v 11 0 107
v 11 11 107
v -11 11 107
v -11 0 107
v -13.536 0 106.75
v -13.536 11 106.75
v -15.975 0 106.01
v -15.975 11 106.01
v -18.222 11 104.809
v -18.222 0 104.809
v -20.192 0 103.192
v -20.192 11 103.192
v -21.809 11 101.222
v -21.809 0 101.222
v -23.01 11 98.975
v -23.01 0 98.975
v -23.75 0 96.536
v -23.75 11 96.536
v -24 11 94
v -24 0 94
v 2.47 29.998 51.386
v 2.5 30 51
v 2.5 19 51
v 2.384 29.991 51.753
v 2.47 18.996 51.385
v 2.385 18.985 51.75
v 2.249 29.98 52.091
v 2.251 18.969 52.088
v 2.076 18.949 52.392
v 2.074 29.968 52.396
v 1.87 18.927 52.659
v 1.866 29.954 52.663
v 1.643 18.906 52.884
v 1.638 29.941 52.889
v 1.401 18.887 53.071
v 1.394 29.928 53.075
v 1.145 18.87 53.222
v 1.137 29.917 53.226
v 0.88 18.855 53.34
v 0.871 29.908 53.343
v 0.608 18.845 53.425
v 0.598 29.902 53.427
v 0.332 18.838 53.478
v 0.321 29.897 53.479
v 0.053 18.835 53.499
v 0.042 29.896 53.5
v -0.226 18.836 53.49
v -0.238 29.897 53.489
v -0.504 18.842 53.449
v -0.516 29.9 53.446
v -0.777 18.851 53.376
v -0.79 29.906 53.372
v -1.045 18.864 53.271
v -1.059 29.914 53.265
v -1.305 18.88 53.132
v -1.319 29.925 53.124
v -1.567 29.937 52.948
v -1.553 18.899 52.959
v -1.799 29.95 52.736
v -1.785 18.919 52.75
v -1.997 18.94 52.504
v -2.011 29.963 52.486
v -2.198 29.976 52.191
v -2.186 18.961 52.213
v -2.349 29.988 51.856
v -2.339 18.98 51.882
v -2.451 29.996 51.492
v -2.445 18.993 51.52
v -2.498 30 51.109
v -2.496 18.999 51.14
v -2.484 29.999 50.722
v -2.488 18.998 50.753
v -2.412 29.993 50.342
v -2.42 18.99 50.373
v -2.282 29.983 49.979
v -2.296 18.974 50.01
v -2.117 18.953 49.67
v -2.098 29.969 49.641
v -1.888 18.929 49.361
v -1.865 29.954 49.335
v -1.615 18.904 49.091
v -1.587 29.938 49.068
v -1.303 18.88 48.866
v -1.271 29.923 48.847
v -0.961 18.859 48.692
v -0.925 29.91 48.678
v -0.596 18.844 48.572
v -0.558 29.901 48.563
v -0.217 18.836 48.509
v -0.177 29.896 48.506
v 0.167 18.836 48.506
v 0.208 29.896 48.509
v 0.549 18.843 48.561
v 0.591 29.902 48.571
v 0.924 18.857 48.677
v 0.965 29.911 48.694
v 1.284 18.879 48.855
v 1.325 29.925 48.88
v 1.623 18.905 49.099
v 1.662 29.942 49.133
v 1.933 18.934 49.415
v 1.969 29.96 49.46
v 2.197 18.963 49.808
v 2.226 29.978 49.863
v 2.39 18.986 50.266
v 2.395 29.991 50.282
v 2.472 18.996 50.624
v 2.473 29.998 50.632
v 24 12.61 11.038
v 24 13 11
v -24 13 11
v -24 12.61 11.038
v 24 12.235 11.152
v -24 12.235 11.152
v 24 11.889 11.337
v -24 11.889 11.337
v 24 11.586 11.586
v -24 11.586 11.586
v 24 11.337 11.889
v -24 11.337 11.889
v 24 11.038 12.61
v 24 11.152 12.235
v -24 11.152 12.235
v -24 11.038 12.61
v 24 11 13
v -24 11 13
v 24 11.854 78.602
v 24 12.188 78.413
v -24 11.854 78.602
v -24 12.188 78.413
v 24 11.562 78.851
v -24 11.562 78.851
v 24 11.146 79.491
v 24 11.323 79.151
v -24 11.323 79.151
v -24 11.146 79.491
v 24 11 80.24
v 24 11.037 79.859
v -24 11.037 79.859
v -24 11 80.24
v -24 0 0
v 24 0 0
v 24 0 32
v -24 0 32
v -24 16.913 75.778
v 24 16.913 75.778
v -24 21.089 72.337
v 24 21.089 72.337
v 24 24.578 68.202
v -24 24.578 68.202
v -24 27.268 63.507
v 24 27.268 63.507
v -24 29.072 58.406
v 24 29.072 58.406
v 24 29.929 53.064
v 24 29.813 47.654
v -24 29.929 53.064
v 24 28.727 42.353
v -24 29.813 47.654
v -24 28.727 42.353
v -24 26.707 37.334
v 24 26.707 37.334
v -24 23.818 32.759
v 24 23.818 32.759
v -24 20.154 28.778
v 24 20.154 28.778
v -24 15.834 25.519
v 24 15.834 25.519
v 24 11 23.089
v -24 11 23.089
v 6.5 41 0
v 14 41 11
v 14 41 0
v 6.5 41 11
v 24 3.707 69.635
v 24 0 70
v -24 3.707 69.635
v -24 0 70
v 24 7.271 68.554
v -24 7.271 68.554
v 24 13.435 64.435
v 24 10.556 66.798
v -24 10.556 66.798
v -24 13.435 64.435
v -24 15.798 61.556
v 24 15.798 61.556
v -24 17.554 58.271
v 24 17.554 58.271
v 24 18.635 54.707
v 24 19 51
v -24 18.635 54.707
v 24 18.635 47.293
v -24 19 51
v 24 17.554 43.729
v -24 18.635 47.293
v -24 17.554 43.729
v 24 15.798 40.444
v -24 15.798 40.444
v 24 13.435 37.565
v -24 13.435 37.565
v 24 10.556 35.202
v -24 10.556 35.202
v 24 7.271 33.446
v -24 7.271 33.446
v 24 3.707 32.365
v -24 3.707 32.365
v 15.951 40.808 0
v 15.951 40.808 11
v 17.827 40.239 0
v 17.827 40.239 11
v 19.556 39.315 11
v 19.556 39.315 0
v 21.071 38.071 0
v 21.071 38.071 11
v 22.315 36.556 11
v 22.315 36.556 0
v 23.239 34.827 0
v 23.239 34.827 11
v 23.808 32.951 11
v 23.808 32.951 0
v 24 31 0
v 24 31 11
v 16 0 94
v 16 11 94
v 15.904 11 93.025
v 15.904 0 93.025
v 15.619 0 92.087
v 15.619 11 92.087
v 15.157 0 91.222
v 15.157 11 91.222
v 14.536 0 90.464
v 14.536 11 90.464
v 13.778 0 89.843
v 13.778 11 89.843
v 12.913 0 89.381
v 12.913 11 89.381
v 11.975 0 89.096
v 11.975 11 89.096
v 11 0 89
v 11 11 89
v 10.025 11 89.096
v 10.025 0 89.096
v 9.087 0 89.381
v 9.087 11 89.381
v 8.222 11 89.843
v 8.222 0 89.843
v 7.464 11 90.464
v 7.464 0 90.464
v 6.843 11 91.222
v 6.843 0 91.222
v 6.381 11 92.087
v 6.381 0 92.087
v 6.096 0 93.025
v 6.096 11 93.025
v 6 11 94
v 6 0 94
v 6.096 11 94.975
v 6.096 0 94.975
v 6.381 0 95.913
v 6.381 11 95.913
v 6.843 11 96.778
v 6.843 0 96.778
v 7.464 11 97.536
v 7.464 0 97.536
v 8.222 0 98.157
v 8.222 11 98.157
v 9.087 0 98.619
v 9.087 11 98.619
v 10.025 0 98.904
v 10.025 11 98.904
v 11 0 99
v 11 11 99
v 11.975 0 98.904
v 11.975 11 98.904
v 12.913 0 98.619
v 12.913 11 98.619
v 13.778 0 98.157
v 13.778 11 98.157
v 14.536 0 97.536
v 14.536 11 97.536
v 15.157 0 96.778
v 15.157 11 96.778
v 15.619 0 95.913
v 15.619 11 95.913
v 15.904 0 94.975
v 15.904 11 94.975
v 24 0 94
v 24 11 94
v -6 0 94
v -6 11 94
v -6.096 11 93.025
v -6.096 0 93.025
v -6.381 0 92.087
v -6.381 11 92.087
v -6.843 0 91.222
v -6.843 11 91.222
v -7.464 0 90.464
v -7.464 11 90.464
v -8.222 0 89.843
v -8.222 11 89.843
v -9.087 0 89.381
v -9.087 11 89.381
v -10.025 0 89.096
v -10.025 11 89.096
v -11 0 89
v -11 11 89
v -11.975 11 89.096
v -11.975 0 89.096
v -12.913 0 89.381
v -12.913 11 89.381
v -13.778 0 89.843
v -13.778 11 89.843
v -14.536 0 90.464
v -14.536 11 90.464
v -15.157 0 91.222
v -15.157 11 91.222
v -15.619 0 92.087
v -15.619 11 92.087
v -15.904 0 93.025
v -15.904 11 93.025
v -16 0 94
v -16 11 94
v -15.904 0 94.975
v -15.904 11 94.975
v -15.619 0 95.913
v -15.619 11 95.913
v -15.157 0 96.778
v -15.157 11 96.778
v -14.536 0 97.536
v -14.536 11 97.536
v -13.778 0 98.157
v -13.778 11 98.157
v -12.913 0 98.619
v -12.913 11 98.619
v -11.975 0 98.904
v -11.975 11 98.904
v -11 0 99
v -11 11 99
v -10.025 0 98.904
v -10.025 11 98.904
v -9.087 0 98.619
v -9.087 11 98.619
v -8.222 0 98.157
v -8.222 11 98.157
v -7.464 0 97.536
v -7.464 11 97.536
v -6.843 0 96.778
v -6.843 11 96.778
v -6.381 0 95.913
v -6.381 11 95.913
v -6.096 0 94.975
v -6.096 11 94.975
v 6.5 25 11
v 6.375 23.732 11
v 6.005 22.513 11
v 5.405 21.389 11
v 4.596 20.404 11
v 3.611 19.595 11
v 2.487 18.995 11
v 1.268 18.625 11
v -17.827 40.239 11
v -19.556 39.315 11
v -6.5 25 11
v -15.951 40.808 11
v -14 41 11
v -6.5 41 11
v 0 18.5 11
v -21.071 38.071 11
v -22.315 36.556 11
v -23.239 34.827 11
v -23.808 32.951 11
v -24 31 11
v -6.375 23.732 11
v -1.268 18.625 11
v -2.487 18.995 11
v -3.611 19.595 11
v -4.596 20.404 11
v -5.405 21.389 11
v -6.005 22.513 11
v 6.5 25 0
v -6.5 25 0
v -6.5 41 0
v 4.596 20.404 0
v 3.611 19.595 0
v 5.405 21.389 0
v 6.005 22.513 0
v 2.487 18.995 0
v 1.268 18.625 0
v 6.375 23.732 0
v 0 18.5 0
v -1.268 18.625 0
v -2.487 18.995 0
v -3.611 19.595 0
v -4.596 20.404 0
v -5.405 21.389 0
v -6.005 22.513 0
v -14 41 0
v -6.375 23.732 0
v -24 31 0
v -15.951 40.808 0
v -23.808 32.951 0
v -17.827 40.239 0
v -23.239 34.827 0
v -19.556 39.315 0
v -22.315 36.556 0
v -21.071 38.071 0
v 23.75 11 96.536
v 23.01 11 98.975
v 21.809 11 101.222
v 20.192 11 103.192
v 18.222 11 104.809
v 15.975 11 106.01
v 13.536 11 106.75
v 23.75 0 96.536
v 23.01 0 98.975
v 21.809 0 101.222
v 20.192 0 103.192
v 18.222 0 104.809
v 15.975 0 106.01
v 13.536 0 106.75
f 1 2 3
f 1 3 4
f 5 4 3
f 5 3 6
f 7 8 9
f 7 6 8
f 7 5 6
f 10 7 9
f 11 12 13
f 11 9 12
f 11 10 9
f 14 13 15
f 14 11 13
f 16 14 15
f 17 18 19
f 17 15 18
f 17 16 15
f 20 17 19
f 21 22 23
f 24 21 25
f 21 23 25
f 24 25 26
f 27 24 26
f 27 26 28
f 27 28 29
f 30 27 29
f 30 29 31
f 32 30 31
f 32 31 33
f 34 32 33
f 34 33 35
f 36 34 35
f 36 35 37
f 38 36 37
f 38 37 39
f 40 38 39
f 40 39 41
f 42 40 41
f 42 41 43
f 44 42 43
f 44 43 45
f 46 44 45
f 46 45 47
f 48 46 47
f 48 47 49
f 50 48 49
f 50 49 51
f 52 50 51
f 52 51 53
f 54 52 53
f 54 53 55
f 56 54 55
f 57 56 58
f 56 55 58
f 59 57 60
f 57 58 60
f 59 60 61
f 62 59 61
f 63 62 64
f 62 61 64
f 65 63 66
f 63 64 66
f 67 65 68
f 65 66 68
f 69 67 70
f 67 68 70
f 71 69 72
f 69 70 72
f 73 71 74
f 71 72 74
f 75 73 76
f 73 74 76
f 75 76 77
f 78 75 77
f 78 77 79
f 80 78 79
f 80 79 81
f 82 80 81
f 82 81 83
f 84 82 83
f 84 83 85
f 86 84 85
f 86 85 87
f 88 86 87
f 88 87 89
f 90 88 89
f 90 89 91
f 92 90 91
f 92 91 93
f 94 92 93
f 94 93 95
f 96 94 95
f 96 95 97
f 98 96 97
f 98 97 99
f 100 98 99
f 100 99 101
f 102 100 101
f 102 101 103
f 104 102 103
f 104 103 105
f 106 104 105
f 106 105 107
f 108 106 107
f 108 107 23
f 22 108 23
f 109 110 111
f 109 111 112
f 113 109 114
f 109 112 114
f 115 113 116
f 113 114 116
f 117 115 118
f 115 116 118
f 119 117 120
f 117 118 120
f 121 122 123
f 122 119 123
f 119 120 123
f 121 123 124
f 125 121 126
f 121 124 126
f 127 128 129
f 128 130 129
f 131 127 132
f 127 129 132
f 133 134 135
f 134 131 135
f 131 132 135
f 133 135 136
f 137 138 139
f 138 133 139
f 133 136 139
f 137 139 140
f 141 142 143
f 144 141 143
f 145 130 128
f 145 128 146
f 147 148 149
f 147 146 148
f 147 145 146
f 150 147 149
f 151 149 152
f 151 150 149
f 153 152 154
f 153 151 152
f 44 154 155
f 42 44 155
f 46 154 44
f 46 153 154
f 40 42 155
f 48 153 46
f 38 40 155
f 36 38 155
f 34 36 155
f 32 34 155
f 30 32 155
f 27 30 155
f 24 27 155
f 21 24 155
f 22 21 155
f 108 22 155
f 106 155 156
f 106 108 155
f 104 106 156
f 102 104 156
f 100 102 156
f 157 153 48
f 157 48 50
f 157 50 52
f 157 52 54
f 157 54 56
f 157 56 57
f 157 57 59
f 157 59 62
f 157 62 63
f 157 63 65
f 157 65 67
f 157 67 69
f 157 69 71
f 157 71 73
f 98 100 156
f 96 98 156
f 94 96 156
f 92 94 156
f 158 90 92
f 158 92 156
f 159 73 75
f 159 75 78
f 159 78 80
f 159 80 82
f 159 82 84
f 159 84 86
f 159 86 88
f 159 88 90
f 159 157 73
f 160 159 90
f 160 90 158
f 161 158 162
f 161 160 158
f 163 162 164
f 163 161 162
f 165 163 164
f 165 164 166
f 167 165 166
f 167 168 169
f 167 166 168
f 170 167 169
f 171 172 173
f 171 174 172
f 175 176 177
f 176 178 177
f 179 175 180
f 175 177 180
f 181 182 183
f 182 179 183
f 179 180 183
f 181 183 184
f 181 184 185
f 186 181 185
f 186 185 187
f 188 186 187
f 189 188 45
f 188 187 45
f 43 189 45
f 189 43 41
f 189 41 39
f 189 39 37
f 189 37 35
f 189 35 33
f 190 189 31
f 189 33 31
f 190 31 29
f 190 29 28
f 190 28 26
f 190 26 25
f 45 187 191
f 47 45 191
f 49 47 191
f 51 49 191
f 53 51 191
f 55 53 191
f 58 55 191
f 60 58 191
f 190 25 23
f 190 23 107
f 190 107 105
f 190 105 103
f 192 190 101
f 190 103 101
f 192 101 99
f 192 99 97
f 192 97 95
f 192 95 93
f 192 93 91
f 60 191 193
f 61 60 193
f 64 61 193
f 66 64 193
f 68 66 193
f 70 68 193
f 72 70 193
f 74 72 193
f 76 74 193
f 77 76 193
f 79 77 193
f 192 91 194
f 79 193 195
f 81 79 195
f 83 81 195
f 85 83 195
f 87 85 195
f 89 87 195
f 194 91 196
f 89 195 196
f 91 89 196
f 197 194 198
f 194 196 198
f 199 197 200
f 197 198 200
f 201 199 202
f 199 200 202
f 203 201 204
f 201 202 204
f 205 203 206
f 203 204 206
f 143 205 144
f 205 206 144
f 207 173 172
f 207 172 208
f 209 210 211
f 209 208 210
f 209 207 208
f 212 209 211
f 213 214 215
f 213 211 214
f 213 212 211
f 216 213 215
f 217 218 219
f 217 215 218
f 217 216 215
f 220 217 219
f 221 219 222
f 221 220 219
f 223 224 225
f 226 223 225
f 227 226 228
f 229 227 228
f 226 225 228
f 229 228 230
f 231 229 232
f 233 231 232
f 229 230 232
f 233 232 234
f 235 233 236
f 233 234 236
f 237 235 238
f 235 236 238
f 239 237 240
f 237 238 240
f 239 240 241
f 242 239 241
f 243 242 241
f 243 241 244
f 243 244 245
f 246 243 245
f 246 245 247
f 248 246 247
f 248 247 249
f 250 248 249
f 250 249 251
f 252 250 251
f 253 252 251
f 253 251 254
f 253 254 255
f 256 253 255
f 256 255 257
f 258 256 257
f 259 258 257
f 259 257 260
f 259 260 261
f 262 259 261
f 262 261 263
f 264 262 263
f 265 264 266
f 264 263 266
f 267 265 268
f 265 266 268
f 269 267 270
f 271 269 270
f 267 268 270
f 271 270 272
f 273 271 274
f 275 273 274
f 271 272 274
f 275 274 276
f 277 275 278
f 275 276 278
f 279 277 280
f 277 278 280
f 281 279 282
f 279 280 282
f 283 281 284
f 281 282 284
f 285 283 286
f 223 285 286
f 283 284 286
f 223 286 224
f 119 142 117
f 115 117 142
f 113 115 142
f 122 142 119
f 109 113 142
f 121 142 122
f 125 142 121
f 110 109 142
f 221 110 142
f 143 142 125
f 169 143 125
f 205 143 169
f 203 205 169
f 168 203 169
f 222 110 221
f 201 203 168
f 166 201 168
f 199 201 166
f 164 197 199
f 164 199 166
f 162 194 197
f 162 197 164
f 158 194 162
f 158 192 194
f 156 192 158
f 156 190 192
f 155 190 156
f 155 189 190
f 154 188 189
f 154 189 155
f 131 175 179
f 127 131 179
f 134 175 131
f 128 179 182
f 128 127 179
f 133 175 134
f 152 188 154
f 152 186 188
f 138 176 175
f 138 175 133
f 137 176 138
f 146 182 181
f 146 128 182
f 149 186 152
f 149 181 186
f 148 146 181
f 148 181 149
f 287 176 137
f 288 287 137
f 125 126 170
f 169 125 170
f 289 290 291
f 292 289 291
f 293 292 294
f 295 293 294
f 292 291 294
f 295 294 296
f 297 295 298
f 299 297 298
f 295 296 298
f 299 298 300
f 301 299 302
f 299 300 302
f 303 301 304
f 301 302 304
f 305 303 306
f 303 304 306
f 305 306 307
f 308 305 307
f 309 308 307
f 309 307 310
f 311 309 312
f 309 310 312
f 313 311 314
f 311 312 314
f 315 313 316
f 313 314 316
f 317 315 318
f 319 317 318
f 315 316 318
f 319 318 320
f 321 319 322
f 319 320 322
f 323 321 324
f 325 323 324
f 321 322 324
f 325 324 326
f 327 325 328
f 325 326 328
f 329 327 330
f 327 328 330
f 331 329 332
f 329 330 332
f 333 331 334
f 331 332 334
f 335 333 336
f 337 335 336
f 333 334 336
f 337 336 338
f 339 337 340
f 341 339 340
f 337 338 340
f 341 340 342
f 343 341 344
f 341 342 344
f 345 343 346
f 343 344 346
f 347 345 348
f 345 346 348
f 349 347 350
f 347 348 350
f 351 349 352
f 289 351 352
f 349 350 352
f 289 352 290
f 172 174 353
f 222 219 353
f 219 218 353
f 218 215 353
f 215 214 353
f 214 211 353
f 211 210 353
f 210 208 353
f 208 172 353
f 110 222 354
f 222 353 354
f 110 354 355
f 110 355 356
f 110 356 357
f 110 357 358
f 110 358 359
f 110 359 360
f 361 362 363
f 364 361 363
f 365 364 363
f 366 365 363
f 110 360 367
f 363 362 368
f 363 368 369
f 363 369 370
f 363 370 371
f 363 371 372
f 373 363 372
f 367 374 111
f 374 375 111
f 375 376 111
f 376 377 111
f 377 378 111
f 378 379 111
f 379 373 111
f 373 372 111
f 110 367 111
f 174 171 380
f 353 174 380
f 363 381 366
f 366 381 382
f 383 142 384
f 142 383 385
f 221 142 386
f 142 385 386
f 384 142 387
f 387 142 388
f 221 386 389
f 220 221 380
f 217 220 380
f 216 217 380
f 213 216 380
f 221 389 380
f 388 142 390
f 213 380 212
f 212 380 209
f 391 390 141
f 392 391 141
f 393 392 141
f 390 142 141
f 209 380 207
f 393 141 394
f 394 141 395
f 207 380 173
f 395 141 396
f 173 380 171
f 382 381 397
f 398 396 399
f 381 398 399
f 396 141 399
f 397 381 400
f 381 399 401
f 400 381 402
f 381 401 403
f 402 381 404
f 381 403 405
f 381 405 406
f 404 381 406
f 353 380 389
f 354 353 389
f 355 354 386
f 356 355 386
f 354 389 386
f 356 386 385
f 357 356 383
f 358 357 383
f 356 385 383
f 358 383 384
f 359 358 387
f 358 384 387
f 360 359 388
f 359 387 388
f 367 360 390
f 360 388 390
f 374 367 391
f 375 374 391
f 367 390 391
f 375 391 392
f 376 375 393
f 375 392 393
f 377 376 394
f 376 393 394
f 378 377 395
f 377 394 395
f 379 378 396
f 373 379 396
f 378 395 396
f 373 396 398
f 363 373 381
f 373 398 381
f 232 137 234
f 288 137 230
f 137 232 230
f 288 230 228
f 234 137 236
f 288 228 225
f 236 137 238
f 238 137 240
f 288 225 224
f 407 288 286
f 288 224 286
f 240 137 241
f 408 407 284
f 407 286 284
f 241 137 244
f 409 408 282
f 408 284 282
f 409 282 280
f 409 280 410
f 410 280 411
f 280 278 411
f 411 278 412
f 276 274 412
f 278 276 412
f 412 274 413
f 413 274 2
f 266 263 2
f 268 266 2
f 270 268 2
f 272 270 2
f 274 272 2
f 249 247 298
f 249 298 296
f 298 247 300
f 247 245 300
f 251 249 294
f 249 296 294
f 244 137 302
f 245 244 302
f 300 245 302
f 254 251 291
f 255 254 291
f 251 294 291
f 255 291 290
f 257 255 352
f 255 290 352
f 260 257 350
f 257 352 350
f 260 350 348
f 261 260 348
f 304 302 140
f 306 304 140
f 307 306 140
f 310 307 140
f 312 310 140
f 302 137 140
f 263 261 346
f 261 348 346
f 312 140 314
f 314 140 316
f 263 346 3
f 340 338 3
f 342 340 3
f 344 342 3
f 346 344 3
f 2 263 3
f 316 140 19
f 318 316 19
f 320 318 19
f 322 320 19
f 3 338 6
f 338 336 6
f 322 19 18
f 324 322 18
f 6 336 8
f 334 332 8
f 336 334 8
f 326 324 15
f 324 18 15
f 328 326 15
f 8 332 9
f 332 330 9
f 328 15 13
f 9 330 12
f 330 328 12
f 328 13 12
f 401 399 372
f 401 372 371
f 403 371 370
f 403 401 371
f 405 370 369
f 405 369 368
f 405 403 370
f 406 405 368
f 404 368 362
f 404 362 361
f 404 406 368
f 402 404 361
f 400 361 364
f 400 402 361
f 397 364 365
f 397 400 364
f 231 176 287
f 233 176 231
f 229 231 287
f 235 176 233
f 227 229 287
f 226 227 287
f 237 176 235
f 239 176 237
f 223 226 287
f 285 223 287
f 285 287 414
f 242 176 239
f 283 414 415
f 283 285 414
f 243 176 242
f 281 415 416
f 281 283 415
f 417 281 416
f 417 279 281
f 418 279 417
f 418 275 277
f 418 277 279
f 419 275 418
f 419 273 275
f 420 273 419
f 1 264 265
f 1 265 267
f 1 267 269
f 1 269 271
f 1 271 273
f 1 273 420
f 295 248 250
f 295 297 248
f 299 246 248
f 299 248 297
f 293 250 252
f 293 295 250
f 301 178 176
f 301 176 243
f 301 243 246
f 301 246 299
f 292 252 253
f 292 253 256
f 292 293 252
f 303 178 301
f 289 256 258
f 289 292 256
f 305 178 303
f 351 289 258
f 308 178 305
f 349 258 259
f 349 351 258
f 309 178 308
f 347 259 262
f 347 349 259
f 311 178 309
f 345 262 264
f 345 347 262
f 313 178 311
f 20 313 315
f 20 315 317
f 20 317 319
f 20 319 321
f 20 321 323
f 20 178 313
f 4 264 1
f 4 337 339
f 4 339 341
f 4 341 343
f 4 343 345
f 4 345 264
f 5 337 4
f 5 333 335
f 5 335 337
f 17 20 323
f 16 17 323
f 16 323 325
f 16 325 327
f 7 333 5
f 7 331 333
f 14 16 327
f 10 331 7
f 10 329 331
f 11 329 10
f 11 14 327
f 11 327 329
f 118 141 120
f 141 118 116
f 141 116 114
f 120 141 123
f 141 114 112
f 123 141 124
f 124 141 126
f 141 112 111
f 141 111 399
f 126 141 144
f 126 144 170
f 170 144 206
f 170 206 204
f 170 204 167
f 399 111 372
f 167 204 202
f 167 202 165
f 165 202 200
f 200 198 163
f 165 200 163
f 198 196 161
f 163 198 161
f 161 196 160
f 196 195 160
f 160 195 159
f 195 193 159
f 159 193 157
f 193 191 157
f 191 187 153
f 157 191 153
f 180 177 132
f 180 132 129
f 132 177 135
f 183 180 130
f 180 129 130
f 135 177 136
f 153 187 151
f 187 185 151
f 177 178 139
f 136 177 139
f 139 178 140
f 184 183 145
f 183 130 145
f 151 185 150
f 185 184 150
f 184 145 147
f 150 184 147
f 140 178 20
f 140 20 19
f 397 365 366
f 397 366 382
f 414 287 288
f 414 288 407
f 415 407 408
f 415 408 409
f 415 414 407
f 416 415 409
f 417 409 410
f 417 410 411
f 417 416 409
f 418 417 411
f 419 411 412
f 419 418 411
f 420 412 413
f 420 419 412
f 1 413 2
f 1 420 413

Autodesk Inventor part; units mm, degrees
ref_plane "YZ Plane" through (0, 0, 0) normal (1, 0, 0) x (0, 1, 0)
ref_plane "XZ Plane" through (0, 0, 0) normal (0, 1, 0) x (-1, 0, 0)
ref_plane "XY Plane" through (0, 0, 0) normal (0, 0, 1) x (1, 0, 0)
sketch "Sketch1" plane through (0, 0, 0) normal (1, 0, 0) x (0, 1, 0)
  line L0 (0, 0) -> (41, 0)
  line L1 (0, 0) -> (0, 32)
  arc A0 (0, 32) -> (0, 70) centre (0, 51) ccw
  line L2 (0, 70) -> (0, 107)
  line L3 (41, 11) -> (11, 11)
  line L4 (11, 11) -> (11, 23.0894)
  arc A1 (11, 23.0894) -> (11, 78.9106) centre (0, 51) ccw
  line L5 (11, 78.9106) -> (11, 107)
  line L6 (11, 107) -> (0, 107)
  line L7 (41, 11) -> (41, 0)
  dimension "d0" = 41
  dimension "d1" = 107
  dimension "d2" = 51
  dimension "d3" = 11
  dimension "d4" = 30
extrude "Extrusion1" add sketch "Sketch1" along normal mid plane 48
fillet "Fillet1" radius 13 2 edges at (-24, 5.5, 107) (24, 5.5, 107)
fillet "Fillet2" radius 2 2 edges at (0, 11, 78.9106) (0, 11, 11)
sketch "Sketch2" plane through (-11, 11, 107) normal (0, 1, 0) x (1, 0, 0)
  arc A0 (-13, 13) -> (0, 0) centre (0, 13) ccw projected
  circle A1 centre (0, 13) radius 5
  arc A2 (22, 0) -> (35, 13) centre (22, 13) ccw projected
  circle A3 centre (22, 13) radius 5
  point P0 (11, 107)
  dimension "d9" = 10
  dimension "d10" = 10
extrude "Extrusion2" cut sketch "Sketch2" against normal through all
sketch "Sketch3" plane through (24, 41, 0) normal (0, 0, -1) x (-1, 0, 0)
  line L0 (48, 0) -> (0, 0) projected
  line L1 (30.5, 0) -> (17.5, 0)
  line L2 (17.5, 0) -> (17.5, -16)
  line L3 (30.5, -16) -> (30.5, 0)
  arc A0 (17.5, -16) -> (30.5, -16) centre (24, -16) ccw
  point P0 (24, -41)
  dimension "d14" = 13
  dimension "d17" = 16
  dimension "d18" = 16
extrude "Extrusion3" cut sketch "Sketch3" against normal up to next
fillet "Fillet3" radius 10 2 edges at (-24, 41, 5.5) (24, 41, 5.5)
sketch "Sketch4" plane through (-24, 0, 0) normal (0, -1, 0) x (1, 0, 0)
  line L0 (48, 70) -> (48, 32) projected
  line L1 (48, 51) -> (0, 51) construction
  line L2 (0, 32) -> (0, 70) projected
  circle A0 centre (24, 51) radius 2.5
  point P0 (24, 0)
  dimension "d22" = 5
extrude "Extrusion4" cut sketch "Sketch4" against normal through all
thread "Thread1" size "M5x0.8" class "6H" standard "ISO Metric profile" full length
properties part number "T05"
